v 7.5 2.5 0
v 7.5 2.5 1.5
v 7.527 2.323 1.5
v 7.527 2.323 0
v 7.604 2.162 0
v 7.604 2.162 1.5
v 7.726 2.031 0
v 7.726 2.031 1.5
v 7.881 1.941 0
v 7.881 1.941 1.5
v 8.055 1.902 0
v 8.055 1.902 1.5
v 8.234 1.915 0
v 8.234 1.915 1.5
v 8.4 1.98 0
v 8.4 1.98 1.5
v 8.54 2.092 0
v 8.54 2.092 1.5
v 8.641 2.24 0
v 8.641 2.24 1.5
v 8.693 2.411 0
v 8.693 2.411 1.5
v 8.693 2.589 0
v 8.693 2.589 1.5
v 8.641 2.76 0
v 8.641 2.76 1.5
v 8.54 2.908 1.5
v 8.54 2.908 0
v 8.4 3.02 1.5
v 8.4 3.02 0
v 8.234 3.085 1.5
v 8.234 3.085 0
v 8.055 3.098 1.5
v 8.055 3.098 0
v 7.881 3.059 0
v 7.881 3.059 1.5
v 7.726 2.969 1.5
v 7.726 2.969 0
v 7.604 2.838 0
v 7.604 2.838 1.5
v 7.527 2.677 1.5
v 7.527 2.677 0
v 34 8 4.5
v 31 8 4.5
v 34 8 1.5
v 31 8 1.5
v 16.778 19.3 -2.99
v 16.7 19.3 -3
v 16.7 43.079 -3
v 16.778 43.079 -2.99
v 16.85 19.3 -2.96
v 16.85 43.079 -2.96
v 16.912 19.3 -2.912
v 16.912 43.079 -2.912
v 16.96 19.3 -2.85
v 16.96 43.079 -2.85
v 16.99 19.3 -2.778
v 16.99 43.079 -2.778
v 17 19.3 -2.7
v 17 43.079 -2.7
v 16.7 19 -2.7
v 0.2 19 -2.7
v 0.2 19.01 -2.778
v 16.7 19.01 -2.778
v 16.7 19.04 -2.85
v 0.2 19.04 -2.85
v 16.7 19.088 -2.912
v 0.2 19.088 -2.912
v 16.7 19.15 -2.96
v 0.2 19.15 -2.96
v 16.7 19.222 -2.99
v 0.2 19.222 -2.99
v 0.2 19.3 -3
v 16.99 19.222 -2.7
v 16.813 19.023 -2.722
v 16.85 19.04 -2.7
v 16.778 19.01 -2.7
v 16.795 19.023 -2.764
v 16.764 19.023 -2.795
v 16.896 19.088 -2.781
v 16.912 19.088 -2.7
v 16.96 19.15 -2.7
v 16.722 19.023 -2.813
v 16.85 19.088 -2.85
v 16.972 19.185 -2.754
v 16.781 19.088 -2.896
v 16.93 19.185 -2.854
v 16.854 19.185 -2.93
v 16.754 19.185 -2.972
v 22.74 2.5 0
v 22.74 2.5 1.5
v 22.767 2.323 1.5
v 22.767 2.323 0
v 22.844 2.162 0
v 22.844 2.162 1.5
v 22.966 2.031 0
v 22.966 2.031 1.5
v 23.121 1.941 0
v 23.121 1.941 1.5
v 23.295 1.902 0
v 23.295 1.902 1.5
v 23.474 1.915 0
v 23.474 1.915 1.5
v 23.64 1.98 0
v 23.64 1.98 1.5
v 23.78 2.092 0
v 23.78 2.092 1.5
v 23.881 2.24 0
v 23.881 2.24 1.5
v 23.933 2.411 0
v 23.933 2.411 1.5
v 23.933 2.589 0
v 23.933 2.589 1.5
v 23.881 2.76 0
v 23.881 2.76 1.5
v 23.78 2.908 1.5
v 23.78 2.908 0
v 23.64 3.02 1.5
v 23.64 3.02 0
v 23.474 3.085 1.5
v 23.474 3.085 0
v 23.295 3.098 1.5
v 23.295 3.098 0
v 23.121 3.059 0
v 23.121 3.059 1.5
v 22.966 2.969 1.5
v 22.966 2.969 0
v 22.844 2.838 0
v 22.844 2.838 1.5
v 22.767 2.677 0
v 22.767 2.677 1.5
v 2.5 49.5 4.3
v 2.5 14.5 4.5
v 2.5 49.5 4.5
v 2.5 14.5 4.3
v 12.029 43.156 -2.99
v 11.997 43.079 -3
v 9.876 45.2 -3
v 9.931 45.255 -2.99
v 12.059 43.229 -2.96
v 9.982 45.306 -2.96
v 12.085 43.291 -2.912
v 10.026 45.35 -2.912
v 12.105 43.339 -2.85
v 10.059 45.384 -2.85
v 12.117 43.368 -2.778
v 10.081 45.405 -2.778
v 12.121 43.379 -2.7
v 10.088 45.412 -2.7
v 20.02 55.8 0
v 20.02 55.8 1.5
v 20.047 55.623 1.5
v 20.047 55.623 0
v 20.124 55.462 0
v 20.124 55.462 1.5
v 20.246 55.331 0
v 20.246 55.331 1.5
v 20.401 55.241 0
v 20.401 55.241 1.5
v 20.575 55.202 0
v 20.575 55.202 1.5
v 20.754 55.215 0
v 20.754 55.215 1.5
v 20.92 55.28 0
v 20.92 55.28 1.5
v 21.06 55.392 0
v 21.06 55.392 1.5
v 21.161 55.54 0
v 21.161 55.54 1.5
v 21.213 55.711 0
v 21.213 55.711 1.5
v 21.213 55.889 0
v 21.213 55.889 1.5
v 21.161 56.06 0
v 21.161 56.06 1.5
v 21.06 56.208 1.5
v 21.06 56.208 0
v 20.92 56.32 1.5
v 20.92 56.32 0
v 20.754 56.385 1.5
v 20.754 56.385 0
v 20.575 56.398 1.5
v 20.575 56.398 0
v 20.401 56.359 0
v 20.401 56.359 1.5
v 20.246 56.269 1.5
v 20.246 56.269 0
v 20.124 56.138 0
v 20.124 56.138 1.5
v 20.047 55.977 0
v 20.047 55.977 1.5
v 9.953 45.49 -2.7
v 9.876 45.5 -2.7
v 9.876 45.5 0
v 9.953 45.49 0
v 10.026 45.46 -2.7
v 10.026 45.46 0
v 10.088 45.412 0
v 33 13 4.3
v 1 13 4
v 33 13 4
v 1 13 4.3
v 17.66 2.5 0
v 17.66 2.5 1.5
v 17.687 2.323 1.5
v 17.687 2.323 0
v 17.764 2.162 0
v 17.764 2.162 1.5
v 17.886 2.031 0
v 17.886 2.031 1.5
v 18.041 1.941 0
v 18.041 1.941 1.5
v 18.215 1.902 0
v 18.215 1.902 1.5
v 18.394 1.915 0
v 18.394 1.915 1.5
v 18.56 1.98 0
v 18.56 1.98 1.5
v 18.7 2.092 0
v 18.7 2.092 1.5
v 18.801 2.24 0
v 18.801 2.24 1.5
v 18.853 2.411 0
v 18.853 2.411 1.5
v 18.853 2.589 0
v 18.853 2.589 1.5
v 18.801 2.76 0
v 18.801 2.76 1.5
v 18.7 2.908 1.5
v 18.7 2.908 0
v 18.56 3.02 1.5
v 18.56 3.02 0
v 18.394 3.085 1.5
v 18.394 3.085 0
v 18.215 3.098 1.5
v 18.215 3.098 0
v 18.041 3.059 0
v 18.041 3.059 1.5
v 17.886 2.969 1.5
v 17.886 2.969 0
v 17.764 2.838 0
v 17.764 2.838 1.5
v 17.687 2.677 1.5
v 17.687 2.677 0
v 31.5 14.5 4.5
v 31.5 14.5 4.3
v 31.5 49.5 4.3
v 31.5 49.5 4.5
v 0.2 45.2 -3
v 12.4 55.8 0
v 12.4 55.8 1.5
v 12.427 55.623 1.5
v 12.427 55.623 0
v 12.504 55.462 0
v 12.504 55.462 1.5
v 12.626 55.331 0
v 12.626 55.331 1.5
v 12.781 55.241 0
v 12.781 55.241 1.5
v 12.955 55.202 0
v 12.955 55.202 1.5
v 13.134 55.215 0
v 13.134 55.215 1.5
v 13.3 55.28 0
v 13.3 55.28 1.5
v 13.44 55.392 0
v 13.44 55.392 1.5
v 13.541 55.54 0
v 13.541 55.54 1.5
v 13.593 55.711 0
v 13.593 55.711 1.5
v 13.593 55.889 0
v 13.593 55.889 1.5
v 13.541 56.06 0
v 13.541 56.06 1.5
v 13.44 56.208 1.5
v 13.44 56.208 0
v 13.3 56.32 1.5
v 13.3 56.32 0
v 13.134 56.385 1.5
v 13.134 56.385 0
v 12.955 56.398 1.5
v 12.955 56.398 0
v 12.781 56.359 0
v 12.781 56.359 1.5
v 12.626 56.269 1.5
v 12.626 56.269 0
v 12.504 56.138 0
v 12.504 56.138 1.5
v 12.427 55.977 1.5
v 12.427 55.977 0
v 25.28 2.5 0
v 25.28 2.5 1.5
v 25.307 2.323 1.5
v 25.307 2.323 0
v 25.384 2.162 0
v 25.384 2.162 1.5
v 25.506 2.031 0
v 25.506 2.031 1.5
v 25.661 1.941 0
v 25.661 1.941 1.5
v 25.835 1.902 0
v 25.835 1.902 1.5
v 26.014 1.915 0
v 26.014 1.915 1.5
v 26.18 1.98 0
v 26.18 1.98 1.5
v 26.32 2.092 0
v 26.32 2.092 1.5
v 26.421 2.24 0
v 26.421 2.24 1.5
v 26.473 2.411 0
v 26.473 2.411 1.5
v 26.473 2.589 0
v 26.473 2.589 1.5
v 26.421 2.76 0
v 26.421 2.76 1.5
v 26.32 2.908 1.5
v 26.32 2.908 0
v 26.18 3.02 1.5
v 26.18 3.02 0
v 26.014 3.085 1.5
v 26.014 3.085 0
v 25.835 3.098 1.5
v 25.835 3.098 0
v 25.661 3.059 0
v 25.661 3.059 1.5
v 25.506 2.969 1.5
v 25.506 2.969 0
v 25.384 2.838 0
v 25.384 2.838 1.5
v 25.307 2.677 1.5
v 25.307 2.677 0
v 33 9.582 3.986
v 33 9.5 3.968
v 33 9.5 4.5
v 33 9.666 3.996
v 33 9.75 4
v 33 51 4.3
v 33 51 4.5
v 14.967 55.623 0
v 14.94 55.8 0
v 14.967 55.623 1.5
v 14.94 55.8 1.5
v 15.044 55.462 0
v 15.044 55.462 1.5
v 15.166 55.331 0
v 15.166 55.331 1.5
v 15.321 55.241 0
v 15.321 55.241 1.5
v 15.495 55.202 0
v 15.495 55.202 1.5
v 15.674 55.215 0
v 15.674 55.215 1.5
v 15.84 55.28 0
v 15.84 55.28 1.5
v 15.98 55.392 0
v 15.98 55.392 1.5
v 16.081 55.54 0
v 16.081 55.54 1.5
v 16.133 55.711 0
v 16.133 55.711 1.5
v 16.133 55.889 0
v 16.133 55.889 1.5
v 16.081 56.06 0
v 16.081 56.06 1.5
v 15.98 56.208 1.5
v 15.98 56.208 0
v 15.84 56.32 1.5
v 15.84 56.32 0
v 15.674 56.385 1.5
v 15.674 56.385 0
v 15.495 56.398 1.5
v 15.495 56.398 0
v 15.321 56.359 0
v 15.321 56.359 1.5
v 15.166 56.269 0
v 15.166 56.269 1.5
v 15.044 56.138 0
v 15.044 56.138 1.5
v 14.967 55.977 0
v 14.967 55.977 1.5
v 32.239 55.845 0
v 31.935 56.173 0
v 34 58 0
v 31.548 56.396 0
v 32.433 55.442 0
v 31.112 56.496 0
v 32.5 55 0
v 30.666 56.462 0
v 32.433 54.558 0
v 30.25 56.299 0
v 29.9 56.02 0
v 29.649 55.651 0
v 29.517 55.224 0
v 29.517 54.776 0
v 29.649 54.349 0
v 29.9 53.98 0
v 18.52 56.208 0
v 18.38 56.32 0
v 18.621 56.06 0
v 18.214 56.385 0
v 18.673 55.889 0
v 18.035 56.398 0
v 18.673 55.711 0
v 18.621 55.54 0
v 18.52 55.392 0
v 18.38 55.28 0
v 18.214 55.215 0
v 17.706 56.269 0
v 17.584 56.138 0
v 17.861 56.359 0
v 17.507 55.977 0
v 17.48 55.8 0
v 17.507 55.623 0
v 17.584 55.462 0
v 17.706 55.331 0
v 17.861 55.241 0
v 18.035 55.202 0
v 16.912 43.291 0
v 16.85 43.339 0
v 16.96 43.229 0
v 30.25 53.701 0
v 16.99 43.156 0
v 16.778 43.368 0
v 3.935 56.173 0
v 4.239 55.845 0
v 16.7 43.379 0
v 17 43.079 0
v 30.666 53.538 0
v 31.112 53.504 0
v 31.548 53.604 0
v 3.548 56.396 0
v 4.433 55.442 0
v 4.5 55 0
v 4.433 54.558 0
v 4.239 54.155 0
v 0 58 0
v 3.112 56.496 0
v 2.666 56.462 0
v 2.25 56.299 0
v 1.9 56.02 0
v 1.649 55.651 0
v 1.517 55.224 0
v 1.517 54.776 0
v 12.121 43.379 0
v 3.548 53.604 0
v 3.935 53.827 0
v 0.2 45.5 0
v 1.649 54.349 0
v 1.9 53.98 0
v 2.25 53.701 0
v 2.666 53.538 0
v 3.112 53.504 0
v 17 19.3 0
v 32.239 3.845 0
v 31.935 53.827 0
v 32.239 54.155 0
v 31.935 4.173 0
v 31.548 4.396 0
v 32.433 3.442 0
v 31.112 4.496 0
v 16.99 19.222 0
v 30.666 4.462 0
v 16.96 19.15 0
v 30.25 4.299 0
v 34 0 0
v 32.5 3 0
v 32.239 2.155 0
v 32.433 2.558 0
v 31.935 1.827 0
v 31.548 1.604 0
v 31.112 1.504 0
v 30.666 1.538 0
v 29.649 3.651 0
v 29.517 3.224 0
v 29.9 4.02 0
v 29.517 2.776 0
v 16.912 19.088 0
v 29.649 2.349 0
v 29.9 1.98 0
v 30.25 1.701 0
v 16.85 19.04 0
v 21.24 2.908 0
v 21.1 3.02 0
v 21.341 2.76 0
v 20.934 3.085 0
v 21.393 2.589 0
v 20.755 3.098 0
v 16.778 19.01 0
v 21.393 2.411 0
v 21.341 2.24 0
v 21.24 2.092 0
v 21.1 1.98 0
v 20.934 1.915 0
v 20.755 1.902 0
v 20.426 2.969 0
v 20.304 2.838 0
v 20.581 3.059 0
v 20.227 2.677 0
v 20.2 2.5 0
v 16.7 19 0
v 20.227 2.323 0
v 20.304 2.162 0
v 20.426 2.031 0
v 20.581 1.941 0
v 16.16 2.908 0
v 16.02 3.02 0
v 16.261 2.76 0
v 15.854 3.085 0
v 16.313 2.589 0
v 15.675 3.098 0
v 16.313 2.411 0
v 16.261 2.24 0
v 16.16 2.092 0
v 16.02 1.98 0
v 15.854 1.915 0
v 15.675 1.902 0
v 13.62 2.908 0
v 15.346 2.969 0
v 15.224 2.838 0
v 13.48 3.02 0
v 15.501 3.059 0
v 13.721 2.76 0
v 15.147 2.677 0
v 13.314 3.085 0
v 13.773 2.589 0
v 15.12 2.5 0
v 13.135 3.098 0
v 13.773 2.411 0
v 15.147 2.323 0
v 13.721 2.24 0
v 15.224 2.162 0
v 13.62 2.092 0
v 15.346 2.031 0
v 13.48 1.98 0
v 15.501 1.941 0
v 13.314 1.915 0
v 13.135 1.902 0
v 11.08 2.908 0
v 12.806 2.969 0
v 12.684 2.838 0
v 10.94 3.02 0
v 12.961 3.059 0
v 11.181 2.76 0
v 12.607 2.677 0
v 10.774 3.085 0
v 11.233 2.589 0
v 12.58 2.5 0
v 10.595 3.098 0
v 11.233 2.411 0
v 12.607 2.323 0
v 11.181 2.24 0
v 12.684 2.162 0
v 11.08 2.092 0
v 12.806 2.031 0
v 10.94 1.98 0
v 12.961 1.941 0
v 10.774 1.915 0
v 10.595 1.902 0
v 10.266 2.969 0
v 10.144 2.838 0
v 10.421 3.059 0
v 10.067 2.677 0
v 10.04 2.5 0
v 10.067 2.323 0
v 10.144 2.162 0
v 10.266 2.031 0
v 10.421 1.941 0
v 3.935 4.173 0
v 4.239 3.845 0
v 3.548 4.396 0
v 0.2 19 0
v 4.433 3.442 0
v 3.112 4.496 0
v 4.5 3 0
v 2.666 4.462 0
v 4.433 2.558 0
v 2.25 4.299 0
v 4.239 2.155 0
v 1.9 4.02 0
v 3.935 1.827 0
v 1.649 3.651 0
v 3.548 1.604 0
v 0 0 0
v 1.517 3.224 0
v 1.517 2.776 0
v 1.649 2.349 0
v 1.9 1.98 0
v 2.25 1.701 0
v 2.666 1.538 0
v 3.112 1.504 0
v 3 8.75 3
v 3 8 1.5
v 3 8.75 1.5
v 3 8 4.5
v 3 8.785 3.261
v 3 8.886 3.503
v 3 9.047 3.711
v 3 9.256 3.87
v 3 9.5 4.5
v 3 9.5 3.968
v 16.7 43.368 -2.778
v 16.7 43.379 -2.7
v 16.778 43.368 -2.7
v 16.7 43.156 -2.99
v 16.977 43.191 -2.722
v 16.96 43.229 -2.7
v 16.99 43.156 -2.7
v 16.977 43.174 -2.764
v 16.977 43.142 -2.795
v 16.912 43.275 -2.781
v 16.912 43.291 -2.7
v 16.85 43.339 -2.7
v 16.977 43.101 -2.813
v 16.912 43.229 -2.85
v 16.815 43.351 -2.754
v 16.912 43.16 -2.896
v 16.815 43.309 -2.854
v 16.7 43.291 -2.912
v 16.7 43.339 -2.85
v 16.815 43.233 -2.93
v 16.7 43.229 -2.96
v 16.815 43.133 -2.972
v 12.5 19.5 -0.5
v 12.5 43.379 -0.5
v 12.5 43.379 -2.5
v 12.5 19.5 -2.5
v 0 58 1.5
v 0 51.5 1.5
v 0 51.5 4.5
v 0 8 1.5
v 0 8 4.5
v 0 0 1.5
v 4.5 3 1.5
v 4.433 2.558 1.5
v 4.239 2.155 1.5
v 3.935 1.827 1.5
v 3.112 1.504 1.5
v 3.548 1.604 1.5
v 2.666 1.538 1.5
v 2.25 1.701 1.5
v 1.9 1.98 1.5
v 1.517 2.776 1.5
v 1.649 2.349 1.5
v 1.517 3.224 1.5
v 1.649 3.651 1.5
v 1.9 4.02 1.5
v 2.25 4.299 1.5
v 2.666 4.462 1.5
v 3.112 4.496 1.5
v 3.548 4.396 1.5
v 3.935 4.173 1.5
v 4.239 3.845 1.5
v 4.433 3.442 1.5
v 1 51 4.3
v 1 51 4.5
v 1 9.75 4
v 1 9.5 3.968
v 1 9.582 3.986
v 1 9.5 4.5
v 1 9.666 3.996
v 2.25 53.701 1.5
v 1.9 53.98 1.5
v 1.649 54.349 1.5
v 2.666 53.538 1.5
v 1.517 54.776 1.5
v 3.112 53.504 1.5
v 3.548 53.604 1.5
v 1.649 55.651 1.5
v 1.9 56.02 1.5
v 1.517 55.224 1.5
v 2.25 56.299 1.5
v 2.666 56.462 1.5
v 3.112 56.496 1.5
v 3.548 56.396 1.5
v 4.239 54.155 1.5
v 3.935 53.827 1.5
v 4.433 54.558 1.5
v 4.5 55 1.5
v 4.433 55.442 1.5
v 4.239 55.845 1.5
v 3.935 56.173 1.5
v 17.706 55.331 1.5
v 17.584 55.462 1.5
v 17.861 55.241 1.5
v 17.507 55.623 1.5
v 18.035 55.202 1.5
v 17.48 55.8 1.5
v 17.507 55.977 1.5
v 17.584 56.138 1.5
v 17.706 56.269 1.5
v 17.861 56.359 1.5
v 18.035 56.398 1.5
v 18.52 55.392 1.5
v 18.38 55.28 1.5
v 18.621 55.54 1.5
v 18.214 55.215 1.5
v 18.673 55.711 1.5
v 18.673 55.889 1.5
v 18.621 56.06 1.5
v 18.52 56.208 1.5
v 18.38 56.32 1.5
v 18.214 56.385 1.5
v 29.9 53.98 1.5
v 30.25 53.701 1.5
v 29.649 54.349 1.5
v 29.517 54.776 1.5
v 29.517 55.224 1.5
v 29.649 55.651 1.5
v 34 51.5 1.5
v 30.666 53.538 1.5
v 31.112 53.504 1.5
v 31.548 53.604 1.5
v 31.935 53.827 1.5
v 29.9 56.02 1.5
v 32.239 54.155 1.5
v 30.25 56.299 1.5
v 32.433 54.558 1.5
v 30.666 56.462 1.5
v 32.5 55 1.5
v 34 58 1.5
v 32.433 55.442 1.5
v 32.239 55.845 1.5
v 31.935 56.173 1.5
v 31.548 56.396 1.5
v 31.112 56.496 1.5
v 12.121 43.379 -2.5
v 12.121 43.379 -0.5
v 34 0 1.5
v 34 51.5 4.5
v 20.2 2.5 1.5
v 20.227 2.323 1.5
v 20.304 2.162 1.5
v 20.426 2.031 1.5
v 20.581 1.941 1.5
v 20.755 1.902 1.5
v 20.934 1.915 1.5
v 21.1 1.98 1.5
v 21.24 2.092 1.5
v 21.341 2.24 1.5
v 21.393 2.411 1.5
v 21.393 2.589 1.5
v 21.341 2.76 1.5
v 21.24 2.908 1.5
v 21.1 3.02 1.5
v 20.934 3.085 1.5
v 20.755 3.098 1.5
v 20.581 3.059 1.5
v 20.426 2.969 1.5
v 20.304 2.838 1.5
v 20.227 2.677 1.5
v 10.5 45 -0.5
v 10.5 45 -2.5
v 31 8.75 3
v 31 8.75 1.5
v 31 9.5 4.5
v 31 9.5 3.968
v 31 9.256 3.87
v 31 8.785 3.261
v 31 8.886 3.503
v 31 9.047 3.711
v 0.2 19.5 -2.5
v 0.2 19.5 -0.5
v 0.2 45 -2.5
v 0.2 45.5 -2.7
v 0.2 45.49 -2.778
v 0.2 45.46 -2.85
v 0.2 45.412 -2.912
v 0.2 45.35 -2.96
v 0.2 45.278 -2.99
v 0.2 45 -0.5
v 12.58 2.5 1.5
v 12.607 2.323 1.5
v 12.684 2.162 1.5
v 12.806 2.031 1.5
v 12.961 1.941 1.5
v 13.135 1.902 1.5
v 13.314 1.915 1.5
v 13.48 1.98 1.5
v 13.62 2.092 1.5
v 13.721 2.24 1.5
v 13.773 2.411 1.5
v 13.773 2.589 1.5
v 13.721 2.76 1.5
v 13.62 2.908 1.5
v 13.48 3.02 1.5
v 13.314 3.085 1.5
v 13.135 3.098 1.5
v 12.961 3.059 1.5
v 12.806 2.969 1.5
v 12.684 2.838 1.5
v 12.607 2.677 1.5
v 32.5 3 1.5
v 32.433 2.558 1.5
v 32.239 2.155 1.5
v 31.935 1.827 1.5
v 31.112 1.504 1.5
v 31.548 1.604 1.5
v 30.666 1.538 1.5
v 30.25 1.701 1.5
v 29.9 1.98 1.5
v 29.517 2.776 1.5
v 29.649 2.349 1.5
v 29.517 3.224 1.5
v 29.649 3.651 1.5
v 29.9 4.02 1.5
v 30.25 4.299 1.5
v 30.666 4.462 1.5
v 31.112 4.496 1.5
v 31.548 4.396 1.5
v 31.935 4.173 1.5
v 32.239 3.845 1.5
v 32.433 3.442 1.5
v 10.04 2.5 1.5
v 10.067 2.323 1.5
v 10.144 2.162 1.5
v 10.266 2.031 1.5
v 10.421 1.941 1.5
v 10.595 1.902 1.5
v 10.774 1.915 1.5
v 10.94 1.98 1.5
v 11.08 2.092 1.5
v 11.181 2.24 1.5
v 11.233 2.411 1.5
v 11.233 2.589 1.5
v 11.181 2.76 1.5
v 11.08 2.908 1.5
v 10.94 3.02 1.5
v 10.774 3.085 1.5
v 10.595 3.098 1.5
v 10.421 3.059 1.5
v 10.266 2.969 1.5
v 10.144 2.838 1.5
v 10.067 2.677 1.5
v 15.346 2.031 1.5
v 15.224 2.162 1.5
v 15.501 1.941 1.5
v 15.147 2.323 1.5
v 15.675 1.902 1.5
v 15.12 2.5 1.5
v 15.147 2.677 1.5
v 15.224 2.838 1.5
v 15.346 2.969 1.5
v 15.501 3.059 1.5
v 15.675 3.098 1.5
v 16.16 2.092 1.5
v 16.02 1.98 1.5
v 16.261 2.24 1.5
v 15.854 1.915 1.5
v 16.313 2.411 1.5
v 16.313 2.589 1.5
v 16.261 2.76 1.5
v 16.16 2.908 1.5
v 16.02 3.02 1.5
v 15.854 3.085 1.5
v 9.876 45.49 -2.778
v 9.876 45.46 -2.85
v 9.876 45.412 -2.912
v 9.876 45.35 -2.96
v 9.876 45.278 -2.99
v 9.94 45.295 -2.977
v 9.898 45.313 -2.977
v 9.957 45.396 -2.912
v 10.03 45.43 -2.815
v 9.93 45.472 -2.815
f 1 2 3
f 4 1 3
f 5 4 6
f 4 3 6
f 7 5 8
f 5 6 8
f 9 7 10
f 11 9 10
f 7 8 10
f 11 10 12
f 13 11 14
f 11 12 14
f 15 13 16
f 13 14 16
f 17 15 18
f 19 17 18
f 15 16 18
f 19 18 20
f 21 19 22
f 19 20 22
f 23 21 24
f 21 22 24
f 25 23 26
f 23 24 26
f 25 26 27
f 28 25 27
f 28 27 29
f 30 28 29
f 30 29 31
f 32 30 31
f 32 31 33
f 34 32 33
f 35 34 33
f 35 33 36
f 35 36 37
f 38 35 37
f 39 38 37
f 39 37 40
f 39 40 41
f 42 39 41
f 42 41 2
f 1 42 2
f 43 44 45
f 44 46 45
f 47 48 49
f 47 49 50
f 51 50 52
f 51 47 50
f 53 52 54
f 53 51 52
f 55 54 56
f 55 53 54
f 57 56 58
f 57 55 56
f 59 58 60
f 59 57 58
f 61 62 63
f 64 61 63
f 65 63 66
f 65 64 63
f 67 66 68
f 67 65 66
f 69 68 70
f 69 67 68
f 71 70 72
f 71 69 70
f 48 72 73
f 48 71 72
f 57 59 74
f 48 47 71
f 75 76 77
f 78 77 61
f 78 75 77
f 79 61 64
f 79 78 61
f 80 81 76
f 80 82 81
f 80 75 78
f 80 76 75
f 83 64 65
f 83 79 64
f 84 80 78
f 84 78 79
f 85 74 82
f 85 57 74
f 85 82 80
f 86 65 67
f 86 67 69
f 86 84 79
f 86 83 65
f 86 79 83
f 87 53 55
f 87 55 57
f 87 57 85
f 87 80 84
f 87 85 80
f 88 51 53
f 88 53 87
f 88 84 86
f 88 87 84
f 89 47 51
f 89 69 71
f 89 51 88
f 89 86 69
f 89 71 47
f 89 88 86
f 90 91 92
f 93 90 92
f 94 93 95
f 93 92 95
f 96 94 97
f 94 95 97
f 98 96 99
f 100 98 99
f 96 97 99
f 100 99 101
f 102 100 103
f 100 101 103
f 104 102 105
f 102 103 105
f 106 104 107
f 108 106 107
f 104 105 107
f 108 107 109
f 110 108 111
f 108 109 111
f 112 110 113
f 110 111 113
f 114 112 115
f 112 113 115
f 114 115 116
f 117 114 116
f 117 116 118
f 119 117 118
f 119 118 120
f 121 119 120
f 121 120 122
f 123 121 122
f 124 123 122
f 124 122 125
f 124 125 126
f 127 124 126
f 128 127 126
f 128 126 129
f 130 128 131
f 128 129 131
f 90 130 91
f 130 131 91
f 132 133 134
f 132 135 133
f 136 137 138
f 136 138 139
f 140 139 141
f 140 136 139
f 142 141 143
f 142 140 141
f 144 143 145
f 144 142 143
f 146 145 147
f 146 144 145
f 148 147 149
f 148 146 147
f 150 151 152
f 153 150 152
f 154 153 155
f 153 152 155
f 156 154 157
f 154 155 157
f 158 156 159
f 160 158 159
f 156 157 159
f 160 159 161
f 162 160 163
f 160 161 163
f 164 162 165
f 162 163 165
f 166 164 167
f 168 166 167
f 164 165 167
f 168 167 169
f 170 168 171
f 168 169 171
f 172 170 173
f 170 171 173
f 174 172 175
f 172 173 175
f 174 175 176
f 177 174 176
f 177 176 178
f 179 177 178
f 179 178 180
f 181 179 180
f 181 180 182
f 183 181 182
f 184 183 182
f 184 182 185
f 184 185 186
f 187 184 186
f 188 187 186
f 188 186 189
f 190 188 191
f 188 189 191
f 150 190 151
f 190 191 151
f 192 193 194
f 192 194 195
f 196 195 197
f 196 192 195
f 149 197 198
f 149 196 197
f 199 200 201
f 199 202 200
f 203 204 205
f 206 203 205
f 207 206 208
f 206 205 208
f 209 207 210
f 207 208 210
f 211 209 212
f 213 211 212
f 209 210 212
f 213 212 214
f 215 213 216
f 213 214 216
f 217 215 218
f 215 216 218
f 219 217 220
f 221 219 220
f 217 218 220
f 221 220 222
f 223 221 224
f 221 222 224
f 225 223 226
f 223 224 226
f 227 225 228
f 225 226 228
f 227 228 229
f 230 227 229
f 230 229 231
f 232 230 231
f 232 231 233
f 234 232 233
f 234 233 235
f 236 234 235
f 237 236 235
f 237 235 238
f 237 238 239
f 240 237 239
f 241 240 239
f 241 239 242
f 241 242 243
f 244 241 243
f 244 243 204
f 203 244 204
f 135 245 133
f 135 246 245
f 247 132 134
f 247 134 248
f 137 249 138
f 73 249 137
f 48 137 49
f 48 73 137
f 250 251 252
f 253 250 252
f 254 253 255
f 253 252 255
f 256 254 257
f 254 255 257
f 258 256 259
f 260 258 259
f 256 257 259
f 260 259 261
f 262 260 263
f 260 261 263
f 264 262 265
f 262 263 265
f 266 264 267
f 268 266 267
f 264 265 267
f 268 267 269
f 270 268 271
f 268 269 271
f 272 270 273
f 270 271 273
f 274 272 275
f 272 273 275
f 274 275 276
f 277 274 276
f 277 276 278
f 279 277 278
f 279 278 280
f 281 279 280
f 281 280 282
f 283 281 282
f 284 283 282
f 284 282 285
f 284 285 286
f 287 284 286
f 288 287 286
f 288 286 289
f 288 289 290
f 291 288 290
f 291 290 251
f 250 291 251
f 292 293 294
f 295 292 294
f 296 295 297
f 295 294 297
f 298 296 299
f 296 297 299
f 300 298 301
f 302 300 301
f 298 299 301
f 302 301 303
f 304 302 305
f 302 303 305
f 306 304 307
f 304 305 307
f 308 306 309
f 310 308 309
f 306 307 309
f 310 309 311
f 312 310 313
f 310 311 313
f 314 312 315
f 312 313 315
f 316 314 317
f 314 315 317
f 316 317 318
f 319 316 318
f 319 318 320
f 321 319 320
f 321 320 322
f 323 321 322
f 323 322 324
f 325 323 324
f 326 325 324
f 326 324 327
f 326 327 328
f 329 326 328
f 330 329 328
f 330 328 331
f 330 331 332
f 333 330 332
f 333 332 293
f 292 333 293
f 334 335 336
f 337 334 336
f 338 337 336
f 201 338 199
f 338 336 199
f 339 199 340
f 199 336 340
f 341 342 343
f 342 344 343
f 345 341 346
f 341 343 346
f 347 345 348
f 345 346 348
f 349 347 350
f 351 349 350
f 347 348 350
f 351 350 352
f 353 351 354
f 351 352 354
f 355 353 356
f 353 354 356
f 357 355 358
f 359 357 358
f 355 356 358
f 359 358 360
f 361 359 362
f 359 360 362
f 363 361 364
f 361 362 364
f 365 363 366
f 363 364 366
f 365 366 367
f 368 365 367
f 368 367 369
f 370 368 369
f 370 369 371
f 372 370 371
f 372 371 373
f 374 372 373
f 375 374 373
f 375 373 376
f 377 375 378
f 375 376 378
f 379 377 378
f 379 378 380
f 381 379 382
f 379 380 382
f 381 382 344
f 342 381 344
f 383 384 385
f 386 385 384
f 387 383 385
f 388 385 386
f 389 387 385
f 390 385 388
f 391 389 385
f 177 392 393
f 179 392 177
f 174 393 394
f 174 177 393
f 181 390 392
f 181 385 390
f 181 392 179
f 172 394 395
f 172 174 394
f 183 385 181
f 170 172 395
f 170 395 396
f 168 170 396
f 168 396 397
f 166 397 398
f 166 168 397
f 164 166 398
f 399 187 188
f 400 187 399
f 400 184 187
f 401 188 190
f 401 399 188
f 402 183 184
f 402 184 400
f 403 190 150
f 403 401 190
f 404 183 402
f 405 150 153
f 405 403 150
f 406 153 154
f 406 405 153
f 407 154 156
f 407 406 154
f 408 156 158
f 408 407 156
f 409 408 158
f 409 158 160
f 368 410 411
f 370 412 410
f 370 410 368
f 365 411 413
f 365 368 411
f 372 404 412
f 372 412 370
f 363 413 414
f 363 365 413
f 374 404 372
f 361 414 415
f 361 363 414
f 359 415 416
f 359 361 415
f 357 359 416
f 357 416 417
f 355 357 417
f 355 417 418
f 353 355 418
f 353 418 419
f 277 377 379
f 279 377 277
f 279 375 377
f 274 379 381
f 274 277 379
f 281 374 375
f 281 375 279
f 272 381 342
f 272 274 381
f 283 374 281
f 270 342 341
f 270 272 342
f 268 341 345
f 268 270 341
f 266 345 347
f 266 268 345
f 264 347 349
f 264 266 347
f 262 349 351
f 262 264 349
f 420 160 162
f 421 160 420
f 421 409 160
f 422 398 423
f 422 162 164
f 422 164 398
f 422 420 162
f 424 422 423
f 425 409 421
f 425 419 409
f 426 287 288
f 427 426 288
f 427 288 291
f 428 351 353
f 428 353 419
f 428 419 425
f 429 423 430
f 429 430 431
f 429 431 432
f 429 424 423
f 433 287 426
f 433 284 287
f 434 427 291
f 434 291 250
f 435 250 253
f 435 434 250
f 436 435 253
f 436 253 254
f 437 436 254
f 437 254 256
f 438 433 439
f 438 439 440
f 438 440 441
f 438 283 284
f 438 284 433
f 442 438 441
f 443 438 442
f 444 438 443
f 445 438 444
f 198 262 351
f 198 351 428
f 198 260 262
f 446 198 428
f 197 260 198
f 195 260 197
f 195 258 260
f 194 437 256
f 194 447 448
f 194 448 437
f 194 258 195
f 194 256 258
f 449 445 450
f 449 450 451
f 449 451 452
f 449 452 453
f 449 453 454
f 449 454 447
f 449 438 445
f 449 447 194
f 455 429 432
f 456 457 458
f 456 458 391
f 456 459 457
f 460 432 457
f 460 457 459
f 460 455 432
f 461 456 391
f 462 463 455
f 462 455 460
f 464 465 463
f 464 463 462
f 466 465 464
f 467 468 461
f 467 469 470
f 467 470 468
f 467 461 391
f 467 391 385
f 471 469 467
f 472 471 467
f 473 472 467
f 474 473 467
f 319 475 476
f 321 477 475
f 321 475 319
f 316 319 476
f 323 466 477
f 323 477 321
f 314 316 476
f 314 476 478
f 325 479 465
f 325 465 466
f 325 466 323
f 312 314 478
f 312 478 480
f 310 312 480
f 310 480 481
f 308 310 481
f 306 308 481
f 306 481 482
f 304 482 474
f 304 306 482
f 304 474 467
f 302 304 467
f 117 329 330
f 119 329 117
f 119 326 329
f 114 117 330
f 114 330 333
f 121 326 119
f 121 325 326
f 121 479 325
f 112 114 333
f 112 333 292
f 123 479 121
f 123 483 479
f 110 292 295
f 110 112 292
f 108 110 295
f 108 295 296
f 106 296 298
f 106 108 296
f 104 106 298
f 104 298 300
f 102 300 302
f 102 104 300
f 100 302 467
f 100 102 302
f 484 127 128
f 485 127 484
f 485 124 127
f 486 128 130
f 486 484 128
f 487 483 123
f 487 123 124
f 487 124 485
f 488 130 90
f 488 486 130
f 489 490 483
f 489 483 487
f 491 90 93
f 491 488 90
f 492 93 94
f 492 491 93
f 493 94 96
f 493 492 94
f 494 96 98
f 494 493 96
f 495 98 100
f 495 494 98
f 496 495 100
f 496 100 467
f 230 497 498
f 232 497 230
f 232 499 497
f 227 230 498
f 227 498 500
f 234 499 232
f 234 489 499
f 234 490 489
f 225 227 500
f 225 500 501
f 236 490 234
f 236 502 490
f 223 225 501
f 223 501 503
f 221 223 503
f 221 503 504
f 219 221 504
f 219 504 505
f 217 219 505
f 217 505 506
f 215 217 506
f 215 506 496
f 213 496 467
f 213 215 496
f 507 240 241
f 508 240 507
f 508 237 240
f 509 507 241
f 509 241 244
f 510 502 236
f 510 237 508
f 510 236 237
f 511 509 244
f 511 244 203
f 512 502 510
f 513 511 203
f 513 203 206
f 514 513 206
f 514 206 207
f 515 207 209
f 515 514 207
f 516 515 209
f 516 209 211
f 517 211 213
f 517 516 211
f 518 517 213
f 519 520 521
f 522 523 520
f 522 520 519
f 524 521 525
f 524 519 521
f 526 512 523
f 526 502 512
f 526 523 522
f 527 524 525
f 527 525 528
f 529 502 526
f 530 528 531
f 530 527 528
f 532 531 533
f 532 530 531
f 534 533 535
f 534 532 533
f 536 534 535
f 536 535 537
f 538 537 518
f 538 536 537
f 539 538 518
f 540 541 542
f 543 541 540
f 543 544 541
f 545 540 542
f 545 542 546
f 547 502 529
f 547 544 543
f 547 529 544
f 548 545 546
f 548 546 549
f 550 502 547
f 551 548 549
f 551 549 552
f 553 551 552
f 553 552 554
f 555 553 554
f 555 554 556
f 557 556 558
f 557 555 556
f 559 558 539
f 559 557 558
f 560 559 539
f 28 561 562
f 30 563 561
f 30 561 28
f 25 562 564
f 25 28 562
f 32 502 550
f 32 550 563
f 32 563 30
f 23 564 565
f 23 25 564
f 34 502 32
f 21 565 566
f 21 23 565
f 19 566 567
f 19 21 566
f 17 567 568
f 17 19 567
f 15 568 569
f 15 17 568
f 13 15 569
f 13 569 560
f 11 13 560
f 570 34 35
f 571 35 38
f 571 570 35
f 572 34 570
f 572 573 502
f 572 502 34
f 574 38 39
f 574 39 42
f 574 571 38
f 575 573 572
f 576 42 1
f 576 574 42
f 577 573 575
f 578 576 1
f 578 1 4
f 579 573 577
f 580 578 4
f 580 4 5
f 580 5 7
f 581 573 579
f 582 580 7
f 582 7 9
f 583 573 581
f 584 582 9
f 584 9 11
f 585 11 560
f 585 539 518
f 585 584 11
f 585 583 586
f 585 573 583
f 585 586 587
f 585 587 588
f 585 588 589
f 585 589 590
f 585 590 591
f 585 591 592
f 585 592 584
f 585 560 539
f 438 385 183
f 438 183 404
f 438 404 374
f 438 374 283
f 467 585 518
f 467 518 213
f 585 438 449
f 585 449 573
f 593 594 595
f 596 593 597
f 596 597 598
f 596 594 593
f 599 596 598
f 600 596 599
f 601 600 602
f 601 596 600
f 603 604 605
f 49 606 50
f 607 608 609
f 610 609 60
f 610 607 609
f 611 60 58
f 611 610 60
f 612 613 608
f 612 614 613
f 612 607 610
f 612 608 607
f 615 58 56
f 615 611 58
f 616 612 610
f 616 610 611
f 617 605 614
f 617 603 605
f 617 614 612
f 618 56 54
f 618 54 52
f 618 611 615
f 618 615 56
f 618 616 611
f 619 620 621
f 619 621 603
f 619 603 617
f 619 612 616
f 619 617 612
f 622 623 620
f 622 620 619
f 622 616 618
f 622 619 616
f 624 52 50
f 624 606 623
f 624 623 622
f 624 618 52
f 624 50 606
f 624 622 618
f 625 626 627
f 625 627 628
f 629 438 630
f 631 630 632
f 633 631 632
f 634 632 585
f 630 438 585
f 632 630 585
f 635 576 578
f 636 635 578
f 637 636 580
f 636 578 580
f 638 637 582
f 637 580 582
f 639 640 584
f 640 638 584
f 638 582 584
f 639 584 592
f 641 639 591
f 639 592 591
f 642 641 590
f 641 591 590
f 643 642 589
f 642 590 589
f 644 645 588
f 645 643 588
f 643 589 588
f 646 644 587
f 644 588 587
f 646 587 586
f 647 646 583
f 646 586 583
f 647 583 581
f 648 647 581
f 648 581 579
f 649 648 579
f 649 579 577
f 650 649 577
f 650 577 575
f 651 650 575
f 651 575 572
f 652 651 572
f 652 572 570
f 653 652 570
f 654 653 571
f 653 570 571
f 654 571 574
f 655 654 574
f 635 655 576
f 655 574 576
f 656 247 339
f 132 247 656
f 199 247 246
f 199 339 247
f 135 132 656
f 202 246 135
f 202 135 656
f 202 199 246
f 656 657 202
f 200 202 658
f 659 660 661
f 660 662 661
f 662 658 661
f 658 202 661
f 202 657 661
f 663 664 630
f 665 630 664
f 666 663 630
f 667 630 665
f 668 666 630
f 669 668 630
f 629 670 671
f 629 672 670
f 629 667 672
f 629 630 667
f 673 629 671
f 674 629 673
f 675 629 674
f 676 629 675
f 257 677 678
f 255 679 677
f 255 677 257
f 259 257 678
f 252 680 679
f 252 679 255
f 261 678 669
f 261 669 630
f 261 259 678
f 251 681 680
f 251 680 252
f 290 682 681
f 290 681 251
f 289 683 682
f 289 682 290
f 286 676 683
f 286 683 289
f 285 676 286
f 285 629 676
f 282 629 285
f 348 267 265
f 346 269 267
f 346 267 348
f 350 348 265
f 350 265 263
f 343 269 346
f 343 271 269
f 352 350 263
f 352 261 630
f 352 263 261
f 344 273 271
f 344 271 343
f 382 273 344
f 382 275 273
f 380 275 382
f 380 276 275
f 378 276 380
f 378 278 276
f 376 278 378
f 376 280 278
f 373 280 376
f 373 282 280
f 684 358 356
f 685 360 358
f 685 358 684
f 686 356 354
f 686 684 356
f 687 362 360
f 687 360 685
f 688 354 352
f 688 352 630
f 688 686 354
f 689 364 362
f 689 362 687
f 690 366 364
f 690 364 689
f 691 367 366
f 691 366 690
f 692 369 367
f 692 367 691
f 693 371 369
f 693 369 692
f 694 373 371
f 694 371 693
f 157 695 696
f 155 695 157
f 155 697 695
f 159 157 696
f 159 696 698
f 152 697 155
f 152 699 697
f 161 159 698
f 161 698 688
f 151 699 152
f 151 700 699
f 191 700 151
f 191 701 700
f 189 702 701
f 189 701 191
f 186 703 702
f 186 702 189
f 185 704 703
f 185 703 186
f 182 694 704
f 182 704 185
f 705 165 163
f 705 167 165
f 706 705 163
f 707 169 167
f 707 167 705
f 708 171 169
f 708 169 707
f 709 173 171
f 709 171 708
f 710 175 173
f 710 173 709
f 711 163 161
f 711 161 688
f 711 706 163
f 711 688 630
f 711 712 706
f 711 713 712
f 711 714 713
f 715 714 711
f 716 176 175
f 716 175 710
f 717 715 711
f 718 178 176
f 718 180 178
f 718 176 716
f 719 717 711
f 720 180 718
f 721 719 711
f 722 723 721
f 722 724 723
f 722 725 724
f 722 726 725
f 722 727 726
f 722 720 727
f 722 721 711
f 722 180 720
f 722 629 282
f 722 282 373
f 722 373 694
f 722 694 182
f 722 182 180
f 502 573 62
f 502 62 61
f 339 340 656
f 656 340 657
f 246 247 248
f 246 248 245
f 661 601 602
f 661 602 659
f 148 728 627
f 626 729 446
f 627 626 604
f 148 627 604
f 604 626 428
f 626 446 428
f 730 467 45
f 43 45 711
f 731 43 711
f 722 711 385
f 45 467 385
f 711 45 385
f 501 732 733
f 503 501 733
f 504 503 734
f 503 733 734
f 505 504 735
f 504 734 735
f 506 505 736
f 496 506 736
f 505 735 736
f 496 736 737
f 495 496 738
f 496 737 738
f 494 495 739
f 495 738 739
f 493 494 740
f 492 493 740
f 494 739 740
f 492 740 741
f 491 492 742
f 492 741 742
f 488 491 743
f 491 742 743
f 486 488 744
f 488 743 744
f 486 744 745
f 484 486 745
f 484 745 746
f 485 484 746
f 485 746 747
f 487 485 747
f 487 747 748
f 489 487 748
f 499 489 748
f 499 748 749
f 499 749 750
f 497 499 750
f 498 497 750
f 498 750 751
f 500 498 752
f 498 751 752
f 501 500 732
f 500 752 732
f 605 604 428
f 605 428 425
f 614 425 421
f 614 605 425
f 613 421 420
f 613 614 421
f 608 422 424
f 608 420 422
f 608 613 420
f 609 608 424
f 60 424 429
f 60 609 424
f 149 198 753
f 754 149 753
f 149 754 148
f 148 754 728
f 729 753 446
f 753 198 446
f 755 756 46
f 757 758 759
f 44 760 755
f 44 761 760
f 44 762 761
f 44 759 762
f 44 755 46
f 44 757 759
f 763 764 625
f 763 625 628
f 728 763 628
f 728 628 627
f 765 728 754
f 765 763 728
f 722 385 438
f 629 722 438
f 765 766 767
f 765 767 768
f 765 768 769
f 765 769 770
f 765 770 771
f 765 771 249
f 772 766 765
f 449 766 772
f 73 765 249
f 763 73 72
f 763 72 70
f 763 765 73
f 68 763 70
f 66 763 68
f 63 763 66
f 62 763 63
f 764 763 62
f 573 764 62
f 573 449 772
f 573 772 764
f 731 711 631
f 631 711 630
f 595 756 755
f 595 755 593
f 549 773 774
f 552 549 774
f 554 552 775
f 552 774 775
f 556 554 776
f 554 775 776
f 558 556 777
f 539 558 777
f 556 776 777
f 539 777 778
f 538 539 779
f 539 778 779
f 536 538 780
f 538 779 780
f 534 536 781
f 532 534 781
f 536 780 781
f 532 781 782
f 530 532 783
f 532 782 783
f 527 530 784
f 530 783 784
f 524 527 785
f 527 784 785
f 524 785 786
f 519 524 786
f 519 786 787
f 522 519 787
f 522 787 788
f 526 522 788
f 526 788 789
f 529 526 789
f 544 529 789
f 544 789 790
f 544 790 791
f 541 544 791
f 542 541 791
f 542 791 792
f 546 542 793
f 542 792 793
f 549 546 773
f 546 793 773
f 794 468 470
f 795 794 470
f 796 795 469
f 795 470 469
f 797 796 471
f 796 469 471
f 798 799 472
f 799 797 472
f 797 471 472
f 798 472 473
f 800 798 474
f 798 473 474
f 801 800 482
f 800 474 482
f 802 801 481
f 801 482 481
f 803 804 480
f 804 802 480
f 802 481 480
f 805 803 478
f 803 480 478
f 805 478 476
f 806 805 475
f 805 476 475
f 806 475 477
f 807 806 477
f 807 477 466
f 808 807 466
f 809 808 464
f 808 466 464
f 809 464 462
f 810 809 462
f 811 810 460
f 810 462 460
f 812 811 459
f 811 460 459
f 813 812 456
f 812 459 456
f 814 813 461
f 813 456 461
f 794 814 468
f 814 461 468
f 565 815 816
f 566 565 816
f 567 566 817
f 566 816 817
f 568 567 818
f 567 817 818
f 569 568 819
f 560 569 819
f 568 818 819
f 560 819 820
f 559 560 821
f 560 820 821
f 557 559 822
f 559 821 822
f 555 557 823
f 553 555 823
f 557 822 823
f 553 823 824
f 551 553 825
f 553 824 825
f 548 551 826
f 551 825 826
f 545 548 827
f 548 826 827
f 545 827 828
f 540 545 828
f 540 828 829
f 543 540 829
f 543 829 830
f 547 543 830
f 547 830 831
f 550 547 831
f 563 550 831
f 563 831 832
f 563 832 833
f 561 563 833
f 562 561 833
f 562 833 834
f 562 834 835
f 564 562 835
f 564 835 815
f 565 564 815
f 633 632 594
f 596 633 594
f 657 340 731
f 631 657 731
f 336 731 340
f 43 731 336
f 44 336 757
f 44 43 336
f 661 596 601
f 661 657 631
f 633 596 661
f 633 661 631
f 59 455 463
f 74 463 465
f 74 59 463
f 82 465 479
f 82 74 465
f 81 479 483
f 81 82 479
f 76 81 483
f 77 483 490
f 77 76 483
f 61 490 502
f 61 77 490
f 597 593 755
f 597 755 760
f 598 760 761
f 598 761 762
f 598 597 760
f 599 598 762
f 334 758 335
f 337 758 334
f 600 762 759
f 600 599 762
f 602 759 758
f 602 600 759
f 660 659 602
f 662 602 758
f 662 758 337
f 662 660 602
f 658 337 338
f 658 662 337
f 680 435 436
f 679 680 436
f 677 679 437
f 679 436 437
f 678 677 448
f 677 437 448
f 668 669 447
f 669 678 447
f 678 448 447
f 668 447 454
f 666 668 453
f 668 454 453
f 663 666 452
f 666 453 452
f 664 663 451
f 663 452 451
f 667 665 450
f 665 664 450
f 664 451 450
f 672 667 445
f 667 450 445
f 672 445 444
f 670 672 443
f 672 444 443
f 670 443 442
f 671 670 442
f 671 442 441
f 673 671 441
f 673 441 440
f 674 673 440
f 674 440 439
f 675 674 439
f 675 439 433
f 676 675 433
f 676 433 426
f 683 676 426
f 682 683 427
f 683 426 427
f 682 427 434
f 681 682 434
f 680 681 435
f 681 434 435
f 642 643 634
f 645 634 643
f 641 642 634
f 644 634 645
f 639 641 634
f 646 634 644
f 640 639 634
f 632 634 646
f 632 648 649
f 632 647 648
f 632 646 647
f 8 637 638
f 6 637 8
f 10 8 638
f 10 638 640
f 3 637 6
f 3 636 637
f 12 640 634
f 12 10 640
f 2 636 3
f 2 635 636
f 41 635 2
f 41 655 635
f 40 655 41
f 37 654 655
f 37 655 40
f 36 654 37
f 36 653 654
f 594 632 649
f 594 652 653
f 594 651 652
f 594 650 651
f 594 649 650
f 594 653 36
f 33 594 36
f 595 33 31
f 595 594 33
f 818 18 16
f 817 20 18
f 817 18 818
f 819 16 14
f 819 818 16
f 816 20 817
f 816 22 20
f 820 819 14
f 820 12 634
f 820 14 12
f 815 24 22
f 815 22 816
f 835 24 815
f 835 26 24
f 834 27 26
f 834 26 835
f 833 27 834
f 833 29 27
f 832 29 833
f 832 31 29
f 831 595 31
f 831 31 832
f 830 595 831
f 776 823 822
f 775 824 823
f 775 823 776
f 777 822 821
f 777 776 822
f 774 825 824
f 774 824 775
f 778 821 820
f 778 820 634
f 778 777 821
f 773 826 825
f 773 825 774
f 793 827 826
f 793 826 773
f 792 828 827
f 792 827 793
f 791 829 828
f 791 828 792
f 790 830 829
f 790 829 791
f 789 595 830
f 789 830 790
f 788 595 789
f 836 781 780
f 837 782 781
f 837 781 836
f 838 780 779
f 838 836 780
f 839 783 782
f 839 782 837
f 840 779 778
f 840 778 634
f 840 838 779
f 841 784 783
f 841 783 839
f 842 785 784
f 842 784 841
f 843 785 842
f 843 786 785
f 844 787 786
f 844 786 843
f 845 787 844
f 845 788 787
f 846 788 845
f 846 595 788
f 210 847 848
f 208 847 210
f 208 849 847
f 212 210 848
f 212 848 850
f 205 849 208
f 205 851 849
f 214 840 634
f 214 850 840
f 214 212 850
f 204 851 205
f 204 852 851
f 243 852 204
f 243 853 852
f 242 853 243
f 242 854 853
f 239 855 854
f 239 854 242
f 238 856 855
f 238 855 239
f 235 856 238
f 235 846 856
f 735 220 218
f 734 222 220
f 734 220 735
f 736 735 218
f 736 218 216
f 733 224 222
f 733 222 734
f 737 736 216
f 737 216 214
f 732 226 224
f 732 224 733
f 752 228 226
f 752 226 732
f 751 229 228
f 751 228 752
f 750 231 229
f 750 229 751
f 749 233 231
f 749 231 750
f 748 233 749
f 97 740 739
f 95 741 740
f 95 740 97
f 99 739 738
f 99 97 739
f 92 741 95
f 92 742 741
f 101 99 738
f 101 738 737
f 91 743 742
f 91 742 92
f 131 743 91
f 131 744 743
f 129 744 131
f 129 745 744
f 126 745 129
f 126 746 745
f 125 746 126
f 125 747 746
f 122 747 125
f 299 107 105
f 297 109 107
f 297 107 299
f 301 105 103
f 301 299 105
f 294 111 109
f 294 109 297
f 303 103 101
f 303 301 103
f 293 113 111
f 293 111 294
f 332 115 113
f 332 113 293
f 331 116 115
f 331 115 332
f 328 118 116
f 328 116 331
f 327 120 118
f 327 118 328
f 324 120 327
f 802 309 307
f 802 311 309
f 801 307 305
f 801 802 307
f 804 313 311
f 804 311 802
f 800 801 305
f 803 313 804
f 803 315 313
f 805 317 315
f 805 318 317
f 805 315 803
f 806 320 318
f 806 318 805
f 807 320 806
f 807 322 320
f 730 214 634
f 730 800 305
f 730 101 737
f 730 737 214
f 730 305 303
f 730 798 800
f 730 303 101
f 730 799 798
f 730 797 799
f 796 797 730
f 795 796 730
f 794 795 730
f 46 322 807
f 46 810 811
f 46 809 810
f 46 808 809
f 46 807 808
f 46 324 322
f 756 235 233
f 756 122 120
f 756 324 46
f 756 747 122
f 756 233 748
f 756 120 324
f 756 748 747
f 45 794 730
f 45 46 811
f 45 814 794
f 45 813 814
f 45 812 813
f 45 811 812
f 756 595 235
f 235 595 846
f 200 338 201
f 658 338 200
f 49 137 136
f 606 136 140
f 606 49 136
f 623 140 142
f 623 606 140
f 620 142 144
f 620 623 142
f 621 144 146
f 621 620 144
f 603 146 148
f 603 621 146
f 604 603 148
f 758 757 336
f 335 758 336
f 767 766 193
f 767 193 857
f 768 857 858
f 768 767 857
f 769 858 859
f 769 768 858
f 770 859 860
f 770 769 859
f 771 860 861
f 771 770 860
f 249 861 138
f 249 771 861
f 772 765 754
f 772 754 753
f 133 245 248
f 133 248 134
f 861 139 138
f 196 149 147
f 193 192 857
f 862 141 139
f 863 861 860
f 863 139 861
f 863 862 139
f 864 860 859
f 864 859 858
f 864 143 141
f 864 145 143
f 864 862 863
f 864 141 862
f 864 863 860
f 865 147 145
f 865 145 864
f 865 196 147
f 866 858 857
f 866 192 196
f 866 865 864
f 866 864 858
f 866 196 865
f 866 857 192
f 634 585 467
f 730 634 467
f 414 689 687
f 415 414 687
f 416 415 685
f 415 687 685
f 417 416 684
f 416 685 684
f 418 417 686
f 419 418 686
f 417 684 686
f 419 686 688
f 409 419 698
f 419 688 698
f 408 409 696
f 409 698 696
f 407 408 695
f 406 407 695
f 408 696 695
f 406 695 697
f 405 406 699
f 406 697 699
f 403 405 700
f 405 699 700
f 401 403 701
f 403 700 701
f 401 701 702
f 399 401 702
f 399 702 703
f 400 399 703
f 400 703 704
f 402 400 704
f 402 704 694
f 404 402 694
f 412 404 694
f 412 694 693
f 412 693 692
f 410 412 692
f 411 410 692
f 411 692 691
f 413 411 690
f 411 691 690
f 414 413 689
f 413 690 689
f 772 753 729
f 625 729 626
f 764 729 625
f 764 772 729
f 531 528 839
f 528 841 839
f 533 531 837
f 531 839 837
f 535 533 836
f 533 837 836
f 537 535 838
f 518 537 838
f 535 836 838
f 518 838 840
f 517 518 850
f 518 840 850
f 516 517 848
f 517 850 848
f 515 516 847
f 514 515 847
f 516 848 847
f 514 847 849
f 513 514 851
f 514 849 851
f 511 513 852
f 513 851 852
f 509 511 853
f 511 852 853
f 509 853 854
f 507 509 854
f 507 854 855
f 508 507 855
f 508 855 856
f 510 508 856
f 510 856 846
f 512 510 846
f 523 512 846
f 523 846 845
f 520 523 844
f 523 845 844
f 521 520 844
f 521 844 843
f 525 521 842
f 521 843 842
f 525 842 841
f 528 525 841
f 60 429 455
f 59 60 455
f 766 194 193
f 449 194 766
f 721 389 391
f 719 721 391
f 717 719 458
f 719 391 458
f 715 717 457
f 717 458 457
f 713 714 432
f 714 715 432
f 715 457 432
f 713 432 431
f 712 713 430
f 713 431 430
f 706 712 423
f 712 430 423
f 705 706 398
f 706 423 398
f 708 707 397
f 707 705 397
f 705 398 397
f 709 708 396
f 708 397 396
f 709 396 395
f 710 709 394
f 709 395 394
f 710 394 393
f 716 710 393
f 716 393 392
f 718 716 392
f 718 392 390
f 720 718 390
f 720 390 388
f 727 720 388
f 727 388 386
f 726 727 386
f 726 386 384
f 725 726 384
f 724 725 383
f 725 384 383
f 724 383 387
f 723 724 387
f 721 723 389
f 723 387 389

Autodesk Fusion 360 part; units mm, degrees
sketch "Sketch1" plane through (0, 0, 0) normal (0, 0, 1) x (1, 0, 0)
  line L0 (0, 0) -> (34, 0)
  line L1 (34, 0) -> (34, 58)
  line L2 (34, 58) -> (0, 58)
  line L3 (0, 58) -> (0, 0)
  circle A0 centre (3, 3) radius 1.5
  circle A1 centre (31, 3) radius 1.5
  circle A2 centre (3, 55) radius 1.5
  circle A3 centre (31, 55) radius 1.5
  dimension "d1" = 34
  dimension "d2" = 58
  dimension "d3" = 3
  dimension "d4" = 3
  dimension "d5" = 3
  dimension "d6" = 3
  dimension "d7" = 3
  dimension "d8" = 3
  dimension "d9" = 3
  dimension "d10" = 3
  dimension "d11" = 3
  dimension "d12" = 3
  dimension "d13" = 3
  dimension "d14" = 3
extrude "Extrude1" add sketch "Sketch1" along normal blind 1.5
sketch "Sketch2" plane through (0, 0, 1.5) normal (0, 0, 1) x (-1, 0, 0)
  circle A0 centre (-31, -3) radius 1.5
  circle A1 centre (-3, -55) radius 1.5
  circle A2 centre (-3, -3) radius 1.5
  circle A3 centre (-31, -55) radius 1.5
  line L0 (0, -58) -> (0, 0)
  line L1 (0, 0) -> (-34, 0)
  line L2 (-34, 0) -> (-34, -58)
  line L3 (-34, -58) -> (0, -58)
  line L4 (0, -8) -> (-34, -8)
  line L5 (-34, -8) -> (-34, -51.5)
  line L6 (-34, -51.5) -> (0, -51.5)
  line L7 (0, -51.5) -> (0, -8)
  dimension "d17" = 43.5
  dimension "d18" = 34
  dimension "d19" = 8
extrude "Extrude2" add sketch "Sketch2" along normal blind 3 contours L0 L2 L4 L5 L6 L7
sketch "Sketch3" plane through (0, 0, 4.5) normal (0, 0, 1) x (-1, 0, 0)
  line L0 (0, -51.5) -> (0, -8)
  line L1 (0, -8) -> (-34, -8)
  line L2 (-34, -8) -> (-34, -51.5)
  line L3 (-34, -51.5) -> (0, -51.5)
  line L4 (-1, -13) -> (-33, -13)
  line L5 (-33, -13) -> (-33, -51)
  line L6 (-33, -51) -> (-1, -51)
  line L7 (-1, -51) -> (-1, -13)
  line L8 (-3, -13) -> (-31, -13)
  line L9 (-31, -13) -> (-31, -8)
  line L10 (-31, -8) -> (-3, -8)
  line L11 (-3, -8) -> (-3, -13)
  line L12 (-3, -9.5) -> (-1, -9.5)
  line L13 (-1, -9.5) -> (-1, -13)
  line L14 (-1, -13) -> (-3, -13)
  line L15 (-3, -13) -> (-3, -9.5)
  line L16 (-31, -9.5) -> (-33, -9.5)
  line L17 (-33, -9.5) -> (-33, -13)
  line L18 (-33, -13) -> (-31, -13)
  line L19 (-31, -13) -> (-31, -9.5)
  dimension "d22" = 5
  dimension "d23" = 0.5
  dimension "d24" = 1
  dimension "d25" = 1
  dimension "d38" = 28
  dimension "d39" = 3
  dimension "d42" = 1.5
  dimension "d43" = 1.5
extrude "Extrude6" cut sketch "Sketch3" against normal blind 3 contours L4 L11 L12 L13 L14 L15 | L4 L9 L16 L17 L18 L19
extrude "Extrude5" cut sketch "Sketch3" against normal blind 3 contours L1 L4 L8 L9 L10 L11 L15 L19
sketch "Sketch4" plane through (0, 0, 1.5) normal (0, 0, 1) x (-1, 0, 0)
  line L0 (0, -58) -> (0, -51.5)
  line L1 (-34, -51.5) -> (-34, -58)
  circle A0 centre (-8.1, -2.5) radius 0.6
  circle A1 centre (-10.64, -2.5) radius 0.6
  circle A2 centre (-13.18, -2.5) radius 0.6
  circle A3 centre (-15.72, -2.5) radius 0.6
  circle A4 centre (-18.26, -2.5) radius 0.6
  circle A5 centre (-20.8, -2.5) radius 0.6
  circle A6 centre (-23.34, -2.5) radius 0.6
  circle A7 centre (-25.88, -2.5) radius 0.6
  line L2 (0, -51.5) -> (-34, -51.5)
  line L3 (-34, -58) -> (0, -58)
  circle A8 centre (-3, -55) radius 1.5
  circle A9 centre (-31, -55) radius 1.5
  dimension "d27" = 1.2
  dimension "d29" = 8.1
  dimension "d32" = -2.54
  dimension "d33" = 0
extrude "Extrude3" cut sketch "Sketch4" against normal blind 1.5 contours A0 | A1 | A2 | A3 | A4 | A5 | A6 | A7
extrude "Extrude4" cut sketch "Sketch3" against normal blind 0.1 contours L4 L5 L6 L7 L8 L14 L18
extrude "Extrude7" cut sketch "Sketch3" against normal blind 0.2 contours L4 L5 L6 L7 L8 L14 L18
sketch "Sketch5" plane through (0, 0, 4.3) normal (0, 0, 1) x (-1, 0, 0)
  line L0 (-33, -51) -> (-1, -51)
  line L1 (-1, -51) -> (-1, -13)
  line L2 (-1, -13) -> (-33, -13)
  line L3 (-33, -13) -> (-33, -51)
  line L4 (-2.5, -49.5) -> (-31.5, -49.5)
  line L5 (-31.5, -49.5) -> (-31.5, -14.5)
  line L6 (-31.5, -14.5) -> (-2.5, -14.5)
  line L7 (-2.5, -14.5) -> (-2.5, -49.5)
  dimension "d48" = 1.5
  dimension "d49" = 1.5
  dimension "d50" = 1.5
  dimension "d51" = 1.5
extrude "Extrude8" add sketch "Sketch5" along normal blind 0.2 contours L4 L5 L6 L7
sketch "Sketch6" plane through (0, 0, 1.5) normal (0, 0, 1) x (-1, 0, 0)
  line L0 (0, -51.5) -> (-34, -51.5)
  line L1 (-34, -51.5) -> (-34, -58)
  line L2 (-34, -58) -> (0, -58)
  line L3 (0, -58) -> (0, -51.5)
  circle A0 centre (-3, -55) radius 1.5
  circle A1 centre (-31, -55) radius 1.5
  circle A2 centre (-13, -55.8) radius 0.6
  circle A3 centre (-15.54, -55.8) radius 0.6
  circle A4 centre (-18.08, -55.8) radius 0.6
  circle A5 centre (-20.62, -55.8) radius 0.6
  dimension "d54" = 1.2
  dimension "d55" = 13
  dimension "d56" = 2.2
  dimension "d59" = -2.54
  dimension "d60" = 0
extrude "Extrude9" cut sketch "Sketch6" against normal blind 1.5 contours A2 | A3 | A4 | A5
sketch "Sketch7" plane through (0, 0, 1.5) normal (0, 0, 1) x (-1, 0, 0)
  circle A0 centre (-20.8, -2.5) radius 0.6
  circle A1 centre (-10.64, -2.5) radius 0.6
  circle A2 centre (-13.18, -2.5) radius 0.6
  circle A3 centre (-23.34, -2.5) radius 0.6
  circle A4 centre (-18.26, -2.5) radius 0.6
  circle A5 centre (-8.1, -2.5) radius 0.6
  circle A6 centre (-15.72, -2.5) radius 0.6
  circle A7 centre (-25.88, -2.5) radius 0.6
  circle A8 centre (-3, -3) radius 1.5
  circle A9 centre (-31, -3) radius 1.5
  line L0 (-31, -9.5) -> (-33, -9.5)
  line L1 (-33, -9.5) -> (-33, -13)
  line L2 (-33, -13) -> (-1, -13)
  line L3 (-1, -13) -> (-1, -9.5)
  line L4 (-1, -9.5) -> (-3, -9.5)
  line L5 (-3, -9.5) -> (-3, -8)
  line L6 (-3, -8) -> (0, -8)
  line L7 (0, -8) -> (0, 0)
  line L8 (0, 0) -> (-34, 0)
  line L9 (-34, 0) -> (-34, -8)
  line L10 (-34, -8) -> (-31, -8)
  line L11 (-31, -8) -> (-31, -9.5)
  line L12 (-1, -13) -> (-33, -13)
  line L13 (-33, -13) -> (-33, -9.5)
  line L14 (-33, -9.5) -> (-1, -9.5)
  line L15 (-1, -9.5) -> (-1, -13)
  line L16 (-3, -9.5) -> (-31, -9.5)
  line L17 (-31, -9.5) -> (-31, -8.75)
  line L18 (-31, -8.75) -> (-3, -8.75)
  line L19 (-3, -8.75) -> (-3, -9.5)
extrude "Extrude10" add sketch "Sketch7" along normal blind 2.5 contours L0 L1 L2 L3 L4 L12 L13 L14 L15 L16 | L5 L11 L14 L16 L17 L18 L19
fillet "Fillet2" radius 1 1 edges at (17, 8.75, 4)
sketch "Sketch8" plane through (0, 0, 0) normal (0, 0, -1) x (1, 0, 0)
  circle A0 centre (15.54, -55.8) radius 0.6
  circle A1 centre (18.08, -55.8) radius 0.6
  circle A2 centre (13, -55.8) radius 0.6
  circle A3 centre (20.62, -55.8) radius 0.6
  circle A4 centre (20.8, -2.5) radius 0.6
  circle A5 centre (10.64, -2.5) radius 0.6
  circle A6 centre (13.18, -2.5) radius 0.6
  circle A7 centre (23.34, -2.5) radius 0.6
  circle A8 centre (18.26, -2.5) radius 0.6
  circle A9 centre (8.1, -2.5) radius 0.6
  circle A10 centre (15.72, -2.5) radius 0.6
  circle A11 centre (25.88, -2.5) radius 0.6
  circle A12 centre (31, -3) radius 1.5
  circle A13 centre (3, -55) radius 1.5
  circle A14 centre (3, -3) radius 1.5
  circle A15 centre (31, -55) radius 1.5
  line L0 (0, 0) -> (0, -58)
  line L1 (0, -58) -> (34, -58)
  line L2 (34, -58) -> (34, 0)
  line L3 (34, 0) -> (0, 0)
  line L4 (0, -19) -> (17, -19)
  line L5 (10, -45.5) -> (0, -45.5)
  line L6 (0, -45.5) -> (0, -19)
  line L7 (10, -45.5) -> (12.1213, -43.3787)
  line L8 (12.1213, -43.3787) -> (17, -43.3787)
  line L9 (17, -43.3787) -> (17, -19)
  dimension "d66" = 19
  dimension "d68" = 26.5
  dimension "d69" = 10
  dimension "d70" = 3
  dimension "d71" = 135
extrude "Extrude11" add sketch "Sketch8" along normal blind 3 contours L0 L4 L5 L6 L7 L8 L9
sketch "Sketch9" plane through (0, 0, 0) normal (-1, 0, 0) x (0, -1, 0)
  line L0 (-58, 0) -> (-45.5, 0)
  line L1 (-45.5, 0) -> (-45.5, -3)
  line L2 (-45.5, -3) -> (-19, -3)
  line L3 (-19, -3) -> (-19, 0)
  line L4 (-19, 0) -> (0, 0)
  line L5 (0, 0) -> (0, 1.5)
  line L6 (0, 1.5) -> (-8, 1.5)
  line L7 (-8, 1.5) -> (-8, 4.5)
  line L8 (-8, 4.5) -> (-51.5, 4.5)
  line L9 (-51.5, 4.5) -> (-51.5, 1.5)
  line L10 (-51.5, 1.5) -> (-58, 1.5)
  line L11 (-58, 1.5) -> (-58, 0)
  line L12 (-45, -0.5) -> (-19.5, -0.5)
  line L13 (-19.5, -0.5) -> (-19.5, -2.5)
  line L14 (-19.5, -2.5) -> (-45, -2.5)
  line L15 (-45, -2.5) -> (-45, -0.5)
  dimension "d74" = 0.5
  dimension "d75" = 0.5
  dimension "d76" = 0.5
  dimension "d77" = 0.5
extrude "Extrude12" cut sketch "Sketch9" against normal blind 12.5 contours L12 L13 L14 L15
fillet "Fillet3" radius 0.3 8 edges at (5, 45.5, -3) (11.0607, 44.4393, -3) (14.5607, 43.3787, -3) (17, 31.1893, -3) (8.5, 19, -3) (17, 43.3787, -1.5) (10, 45.5, -1.5) (17, 19, -1.5)
sketch "Sketch10" plane through (0, 0, 0) normal (-1, 0, 0) x (0, -1, 0)
  arc A0 (-19.3, -3) -> (-19, -2.7) centre (-19.3, -2.7) ccw
  line L0 (-19, -2.7) -> (-19, 0)
  line L1 (-19, 0) -> (0, 0)
  line L2 (0, 0) -> (0, 1.5)
  line L3 (0, 1.5) -> (-8, 1.5)
  line L4 (-8, 1.5) -> (-8, 4.5)
  line L5 (-8, 4.5) -> (-51.5, 4.5)
  line L6 (-51.5, 4.5) -> (-51.5, 1.5)
  line L7 (-51.5, 1.5) -> (-58, 1.5)
  line L8 (-58, 1.5) -> (-58, 0)
  line L9 (-58, 0) -> (-45.5, 0)
  line L10 (-45.5, 0) -> (-45.5, -2.7)
  arc A1 (-45.5, -2.7) -> (-45.2, -3) centre (-45.2, -2.7) ccw
  line L11 (-45.2, -3) -> (-19.3, -3)
  line L12 (-19.5, -0.5) -> (-19.5, -2.5)
  line L13 (-19.5, -2.5) -> (-45, -2.5)
  line L14 (-45, -2.5) -> (-45, -0.5)
  line L15 (-45, -0.5) -> (-19.5, -0.5)
  line L16 (-45.5, 0) -> (-19, 0)
  line L17 (-19, 0) -> (-19, -3)
  line L18 (-19, -3) -> (-45.5, -3)
  line L19 (-45.5, -3) -> (-45.5, 0)
extrude "Extrude13" cut sketch "Sketch10" against normal blind 0.2 contours A0 L0 L10 A1 L11 L16 L17 L18 L19
